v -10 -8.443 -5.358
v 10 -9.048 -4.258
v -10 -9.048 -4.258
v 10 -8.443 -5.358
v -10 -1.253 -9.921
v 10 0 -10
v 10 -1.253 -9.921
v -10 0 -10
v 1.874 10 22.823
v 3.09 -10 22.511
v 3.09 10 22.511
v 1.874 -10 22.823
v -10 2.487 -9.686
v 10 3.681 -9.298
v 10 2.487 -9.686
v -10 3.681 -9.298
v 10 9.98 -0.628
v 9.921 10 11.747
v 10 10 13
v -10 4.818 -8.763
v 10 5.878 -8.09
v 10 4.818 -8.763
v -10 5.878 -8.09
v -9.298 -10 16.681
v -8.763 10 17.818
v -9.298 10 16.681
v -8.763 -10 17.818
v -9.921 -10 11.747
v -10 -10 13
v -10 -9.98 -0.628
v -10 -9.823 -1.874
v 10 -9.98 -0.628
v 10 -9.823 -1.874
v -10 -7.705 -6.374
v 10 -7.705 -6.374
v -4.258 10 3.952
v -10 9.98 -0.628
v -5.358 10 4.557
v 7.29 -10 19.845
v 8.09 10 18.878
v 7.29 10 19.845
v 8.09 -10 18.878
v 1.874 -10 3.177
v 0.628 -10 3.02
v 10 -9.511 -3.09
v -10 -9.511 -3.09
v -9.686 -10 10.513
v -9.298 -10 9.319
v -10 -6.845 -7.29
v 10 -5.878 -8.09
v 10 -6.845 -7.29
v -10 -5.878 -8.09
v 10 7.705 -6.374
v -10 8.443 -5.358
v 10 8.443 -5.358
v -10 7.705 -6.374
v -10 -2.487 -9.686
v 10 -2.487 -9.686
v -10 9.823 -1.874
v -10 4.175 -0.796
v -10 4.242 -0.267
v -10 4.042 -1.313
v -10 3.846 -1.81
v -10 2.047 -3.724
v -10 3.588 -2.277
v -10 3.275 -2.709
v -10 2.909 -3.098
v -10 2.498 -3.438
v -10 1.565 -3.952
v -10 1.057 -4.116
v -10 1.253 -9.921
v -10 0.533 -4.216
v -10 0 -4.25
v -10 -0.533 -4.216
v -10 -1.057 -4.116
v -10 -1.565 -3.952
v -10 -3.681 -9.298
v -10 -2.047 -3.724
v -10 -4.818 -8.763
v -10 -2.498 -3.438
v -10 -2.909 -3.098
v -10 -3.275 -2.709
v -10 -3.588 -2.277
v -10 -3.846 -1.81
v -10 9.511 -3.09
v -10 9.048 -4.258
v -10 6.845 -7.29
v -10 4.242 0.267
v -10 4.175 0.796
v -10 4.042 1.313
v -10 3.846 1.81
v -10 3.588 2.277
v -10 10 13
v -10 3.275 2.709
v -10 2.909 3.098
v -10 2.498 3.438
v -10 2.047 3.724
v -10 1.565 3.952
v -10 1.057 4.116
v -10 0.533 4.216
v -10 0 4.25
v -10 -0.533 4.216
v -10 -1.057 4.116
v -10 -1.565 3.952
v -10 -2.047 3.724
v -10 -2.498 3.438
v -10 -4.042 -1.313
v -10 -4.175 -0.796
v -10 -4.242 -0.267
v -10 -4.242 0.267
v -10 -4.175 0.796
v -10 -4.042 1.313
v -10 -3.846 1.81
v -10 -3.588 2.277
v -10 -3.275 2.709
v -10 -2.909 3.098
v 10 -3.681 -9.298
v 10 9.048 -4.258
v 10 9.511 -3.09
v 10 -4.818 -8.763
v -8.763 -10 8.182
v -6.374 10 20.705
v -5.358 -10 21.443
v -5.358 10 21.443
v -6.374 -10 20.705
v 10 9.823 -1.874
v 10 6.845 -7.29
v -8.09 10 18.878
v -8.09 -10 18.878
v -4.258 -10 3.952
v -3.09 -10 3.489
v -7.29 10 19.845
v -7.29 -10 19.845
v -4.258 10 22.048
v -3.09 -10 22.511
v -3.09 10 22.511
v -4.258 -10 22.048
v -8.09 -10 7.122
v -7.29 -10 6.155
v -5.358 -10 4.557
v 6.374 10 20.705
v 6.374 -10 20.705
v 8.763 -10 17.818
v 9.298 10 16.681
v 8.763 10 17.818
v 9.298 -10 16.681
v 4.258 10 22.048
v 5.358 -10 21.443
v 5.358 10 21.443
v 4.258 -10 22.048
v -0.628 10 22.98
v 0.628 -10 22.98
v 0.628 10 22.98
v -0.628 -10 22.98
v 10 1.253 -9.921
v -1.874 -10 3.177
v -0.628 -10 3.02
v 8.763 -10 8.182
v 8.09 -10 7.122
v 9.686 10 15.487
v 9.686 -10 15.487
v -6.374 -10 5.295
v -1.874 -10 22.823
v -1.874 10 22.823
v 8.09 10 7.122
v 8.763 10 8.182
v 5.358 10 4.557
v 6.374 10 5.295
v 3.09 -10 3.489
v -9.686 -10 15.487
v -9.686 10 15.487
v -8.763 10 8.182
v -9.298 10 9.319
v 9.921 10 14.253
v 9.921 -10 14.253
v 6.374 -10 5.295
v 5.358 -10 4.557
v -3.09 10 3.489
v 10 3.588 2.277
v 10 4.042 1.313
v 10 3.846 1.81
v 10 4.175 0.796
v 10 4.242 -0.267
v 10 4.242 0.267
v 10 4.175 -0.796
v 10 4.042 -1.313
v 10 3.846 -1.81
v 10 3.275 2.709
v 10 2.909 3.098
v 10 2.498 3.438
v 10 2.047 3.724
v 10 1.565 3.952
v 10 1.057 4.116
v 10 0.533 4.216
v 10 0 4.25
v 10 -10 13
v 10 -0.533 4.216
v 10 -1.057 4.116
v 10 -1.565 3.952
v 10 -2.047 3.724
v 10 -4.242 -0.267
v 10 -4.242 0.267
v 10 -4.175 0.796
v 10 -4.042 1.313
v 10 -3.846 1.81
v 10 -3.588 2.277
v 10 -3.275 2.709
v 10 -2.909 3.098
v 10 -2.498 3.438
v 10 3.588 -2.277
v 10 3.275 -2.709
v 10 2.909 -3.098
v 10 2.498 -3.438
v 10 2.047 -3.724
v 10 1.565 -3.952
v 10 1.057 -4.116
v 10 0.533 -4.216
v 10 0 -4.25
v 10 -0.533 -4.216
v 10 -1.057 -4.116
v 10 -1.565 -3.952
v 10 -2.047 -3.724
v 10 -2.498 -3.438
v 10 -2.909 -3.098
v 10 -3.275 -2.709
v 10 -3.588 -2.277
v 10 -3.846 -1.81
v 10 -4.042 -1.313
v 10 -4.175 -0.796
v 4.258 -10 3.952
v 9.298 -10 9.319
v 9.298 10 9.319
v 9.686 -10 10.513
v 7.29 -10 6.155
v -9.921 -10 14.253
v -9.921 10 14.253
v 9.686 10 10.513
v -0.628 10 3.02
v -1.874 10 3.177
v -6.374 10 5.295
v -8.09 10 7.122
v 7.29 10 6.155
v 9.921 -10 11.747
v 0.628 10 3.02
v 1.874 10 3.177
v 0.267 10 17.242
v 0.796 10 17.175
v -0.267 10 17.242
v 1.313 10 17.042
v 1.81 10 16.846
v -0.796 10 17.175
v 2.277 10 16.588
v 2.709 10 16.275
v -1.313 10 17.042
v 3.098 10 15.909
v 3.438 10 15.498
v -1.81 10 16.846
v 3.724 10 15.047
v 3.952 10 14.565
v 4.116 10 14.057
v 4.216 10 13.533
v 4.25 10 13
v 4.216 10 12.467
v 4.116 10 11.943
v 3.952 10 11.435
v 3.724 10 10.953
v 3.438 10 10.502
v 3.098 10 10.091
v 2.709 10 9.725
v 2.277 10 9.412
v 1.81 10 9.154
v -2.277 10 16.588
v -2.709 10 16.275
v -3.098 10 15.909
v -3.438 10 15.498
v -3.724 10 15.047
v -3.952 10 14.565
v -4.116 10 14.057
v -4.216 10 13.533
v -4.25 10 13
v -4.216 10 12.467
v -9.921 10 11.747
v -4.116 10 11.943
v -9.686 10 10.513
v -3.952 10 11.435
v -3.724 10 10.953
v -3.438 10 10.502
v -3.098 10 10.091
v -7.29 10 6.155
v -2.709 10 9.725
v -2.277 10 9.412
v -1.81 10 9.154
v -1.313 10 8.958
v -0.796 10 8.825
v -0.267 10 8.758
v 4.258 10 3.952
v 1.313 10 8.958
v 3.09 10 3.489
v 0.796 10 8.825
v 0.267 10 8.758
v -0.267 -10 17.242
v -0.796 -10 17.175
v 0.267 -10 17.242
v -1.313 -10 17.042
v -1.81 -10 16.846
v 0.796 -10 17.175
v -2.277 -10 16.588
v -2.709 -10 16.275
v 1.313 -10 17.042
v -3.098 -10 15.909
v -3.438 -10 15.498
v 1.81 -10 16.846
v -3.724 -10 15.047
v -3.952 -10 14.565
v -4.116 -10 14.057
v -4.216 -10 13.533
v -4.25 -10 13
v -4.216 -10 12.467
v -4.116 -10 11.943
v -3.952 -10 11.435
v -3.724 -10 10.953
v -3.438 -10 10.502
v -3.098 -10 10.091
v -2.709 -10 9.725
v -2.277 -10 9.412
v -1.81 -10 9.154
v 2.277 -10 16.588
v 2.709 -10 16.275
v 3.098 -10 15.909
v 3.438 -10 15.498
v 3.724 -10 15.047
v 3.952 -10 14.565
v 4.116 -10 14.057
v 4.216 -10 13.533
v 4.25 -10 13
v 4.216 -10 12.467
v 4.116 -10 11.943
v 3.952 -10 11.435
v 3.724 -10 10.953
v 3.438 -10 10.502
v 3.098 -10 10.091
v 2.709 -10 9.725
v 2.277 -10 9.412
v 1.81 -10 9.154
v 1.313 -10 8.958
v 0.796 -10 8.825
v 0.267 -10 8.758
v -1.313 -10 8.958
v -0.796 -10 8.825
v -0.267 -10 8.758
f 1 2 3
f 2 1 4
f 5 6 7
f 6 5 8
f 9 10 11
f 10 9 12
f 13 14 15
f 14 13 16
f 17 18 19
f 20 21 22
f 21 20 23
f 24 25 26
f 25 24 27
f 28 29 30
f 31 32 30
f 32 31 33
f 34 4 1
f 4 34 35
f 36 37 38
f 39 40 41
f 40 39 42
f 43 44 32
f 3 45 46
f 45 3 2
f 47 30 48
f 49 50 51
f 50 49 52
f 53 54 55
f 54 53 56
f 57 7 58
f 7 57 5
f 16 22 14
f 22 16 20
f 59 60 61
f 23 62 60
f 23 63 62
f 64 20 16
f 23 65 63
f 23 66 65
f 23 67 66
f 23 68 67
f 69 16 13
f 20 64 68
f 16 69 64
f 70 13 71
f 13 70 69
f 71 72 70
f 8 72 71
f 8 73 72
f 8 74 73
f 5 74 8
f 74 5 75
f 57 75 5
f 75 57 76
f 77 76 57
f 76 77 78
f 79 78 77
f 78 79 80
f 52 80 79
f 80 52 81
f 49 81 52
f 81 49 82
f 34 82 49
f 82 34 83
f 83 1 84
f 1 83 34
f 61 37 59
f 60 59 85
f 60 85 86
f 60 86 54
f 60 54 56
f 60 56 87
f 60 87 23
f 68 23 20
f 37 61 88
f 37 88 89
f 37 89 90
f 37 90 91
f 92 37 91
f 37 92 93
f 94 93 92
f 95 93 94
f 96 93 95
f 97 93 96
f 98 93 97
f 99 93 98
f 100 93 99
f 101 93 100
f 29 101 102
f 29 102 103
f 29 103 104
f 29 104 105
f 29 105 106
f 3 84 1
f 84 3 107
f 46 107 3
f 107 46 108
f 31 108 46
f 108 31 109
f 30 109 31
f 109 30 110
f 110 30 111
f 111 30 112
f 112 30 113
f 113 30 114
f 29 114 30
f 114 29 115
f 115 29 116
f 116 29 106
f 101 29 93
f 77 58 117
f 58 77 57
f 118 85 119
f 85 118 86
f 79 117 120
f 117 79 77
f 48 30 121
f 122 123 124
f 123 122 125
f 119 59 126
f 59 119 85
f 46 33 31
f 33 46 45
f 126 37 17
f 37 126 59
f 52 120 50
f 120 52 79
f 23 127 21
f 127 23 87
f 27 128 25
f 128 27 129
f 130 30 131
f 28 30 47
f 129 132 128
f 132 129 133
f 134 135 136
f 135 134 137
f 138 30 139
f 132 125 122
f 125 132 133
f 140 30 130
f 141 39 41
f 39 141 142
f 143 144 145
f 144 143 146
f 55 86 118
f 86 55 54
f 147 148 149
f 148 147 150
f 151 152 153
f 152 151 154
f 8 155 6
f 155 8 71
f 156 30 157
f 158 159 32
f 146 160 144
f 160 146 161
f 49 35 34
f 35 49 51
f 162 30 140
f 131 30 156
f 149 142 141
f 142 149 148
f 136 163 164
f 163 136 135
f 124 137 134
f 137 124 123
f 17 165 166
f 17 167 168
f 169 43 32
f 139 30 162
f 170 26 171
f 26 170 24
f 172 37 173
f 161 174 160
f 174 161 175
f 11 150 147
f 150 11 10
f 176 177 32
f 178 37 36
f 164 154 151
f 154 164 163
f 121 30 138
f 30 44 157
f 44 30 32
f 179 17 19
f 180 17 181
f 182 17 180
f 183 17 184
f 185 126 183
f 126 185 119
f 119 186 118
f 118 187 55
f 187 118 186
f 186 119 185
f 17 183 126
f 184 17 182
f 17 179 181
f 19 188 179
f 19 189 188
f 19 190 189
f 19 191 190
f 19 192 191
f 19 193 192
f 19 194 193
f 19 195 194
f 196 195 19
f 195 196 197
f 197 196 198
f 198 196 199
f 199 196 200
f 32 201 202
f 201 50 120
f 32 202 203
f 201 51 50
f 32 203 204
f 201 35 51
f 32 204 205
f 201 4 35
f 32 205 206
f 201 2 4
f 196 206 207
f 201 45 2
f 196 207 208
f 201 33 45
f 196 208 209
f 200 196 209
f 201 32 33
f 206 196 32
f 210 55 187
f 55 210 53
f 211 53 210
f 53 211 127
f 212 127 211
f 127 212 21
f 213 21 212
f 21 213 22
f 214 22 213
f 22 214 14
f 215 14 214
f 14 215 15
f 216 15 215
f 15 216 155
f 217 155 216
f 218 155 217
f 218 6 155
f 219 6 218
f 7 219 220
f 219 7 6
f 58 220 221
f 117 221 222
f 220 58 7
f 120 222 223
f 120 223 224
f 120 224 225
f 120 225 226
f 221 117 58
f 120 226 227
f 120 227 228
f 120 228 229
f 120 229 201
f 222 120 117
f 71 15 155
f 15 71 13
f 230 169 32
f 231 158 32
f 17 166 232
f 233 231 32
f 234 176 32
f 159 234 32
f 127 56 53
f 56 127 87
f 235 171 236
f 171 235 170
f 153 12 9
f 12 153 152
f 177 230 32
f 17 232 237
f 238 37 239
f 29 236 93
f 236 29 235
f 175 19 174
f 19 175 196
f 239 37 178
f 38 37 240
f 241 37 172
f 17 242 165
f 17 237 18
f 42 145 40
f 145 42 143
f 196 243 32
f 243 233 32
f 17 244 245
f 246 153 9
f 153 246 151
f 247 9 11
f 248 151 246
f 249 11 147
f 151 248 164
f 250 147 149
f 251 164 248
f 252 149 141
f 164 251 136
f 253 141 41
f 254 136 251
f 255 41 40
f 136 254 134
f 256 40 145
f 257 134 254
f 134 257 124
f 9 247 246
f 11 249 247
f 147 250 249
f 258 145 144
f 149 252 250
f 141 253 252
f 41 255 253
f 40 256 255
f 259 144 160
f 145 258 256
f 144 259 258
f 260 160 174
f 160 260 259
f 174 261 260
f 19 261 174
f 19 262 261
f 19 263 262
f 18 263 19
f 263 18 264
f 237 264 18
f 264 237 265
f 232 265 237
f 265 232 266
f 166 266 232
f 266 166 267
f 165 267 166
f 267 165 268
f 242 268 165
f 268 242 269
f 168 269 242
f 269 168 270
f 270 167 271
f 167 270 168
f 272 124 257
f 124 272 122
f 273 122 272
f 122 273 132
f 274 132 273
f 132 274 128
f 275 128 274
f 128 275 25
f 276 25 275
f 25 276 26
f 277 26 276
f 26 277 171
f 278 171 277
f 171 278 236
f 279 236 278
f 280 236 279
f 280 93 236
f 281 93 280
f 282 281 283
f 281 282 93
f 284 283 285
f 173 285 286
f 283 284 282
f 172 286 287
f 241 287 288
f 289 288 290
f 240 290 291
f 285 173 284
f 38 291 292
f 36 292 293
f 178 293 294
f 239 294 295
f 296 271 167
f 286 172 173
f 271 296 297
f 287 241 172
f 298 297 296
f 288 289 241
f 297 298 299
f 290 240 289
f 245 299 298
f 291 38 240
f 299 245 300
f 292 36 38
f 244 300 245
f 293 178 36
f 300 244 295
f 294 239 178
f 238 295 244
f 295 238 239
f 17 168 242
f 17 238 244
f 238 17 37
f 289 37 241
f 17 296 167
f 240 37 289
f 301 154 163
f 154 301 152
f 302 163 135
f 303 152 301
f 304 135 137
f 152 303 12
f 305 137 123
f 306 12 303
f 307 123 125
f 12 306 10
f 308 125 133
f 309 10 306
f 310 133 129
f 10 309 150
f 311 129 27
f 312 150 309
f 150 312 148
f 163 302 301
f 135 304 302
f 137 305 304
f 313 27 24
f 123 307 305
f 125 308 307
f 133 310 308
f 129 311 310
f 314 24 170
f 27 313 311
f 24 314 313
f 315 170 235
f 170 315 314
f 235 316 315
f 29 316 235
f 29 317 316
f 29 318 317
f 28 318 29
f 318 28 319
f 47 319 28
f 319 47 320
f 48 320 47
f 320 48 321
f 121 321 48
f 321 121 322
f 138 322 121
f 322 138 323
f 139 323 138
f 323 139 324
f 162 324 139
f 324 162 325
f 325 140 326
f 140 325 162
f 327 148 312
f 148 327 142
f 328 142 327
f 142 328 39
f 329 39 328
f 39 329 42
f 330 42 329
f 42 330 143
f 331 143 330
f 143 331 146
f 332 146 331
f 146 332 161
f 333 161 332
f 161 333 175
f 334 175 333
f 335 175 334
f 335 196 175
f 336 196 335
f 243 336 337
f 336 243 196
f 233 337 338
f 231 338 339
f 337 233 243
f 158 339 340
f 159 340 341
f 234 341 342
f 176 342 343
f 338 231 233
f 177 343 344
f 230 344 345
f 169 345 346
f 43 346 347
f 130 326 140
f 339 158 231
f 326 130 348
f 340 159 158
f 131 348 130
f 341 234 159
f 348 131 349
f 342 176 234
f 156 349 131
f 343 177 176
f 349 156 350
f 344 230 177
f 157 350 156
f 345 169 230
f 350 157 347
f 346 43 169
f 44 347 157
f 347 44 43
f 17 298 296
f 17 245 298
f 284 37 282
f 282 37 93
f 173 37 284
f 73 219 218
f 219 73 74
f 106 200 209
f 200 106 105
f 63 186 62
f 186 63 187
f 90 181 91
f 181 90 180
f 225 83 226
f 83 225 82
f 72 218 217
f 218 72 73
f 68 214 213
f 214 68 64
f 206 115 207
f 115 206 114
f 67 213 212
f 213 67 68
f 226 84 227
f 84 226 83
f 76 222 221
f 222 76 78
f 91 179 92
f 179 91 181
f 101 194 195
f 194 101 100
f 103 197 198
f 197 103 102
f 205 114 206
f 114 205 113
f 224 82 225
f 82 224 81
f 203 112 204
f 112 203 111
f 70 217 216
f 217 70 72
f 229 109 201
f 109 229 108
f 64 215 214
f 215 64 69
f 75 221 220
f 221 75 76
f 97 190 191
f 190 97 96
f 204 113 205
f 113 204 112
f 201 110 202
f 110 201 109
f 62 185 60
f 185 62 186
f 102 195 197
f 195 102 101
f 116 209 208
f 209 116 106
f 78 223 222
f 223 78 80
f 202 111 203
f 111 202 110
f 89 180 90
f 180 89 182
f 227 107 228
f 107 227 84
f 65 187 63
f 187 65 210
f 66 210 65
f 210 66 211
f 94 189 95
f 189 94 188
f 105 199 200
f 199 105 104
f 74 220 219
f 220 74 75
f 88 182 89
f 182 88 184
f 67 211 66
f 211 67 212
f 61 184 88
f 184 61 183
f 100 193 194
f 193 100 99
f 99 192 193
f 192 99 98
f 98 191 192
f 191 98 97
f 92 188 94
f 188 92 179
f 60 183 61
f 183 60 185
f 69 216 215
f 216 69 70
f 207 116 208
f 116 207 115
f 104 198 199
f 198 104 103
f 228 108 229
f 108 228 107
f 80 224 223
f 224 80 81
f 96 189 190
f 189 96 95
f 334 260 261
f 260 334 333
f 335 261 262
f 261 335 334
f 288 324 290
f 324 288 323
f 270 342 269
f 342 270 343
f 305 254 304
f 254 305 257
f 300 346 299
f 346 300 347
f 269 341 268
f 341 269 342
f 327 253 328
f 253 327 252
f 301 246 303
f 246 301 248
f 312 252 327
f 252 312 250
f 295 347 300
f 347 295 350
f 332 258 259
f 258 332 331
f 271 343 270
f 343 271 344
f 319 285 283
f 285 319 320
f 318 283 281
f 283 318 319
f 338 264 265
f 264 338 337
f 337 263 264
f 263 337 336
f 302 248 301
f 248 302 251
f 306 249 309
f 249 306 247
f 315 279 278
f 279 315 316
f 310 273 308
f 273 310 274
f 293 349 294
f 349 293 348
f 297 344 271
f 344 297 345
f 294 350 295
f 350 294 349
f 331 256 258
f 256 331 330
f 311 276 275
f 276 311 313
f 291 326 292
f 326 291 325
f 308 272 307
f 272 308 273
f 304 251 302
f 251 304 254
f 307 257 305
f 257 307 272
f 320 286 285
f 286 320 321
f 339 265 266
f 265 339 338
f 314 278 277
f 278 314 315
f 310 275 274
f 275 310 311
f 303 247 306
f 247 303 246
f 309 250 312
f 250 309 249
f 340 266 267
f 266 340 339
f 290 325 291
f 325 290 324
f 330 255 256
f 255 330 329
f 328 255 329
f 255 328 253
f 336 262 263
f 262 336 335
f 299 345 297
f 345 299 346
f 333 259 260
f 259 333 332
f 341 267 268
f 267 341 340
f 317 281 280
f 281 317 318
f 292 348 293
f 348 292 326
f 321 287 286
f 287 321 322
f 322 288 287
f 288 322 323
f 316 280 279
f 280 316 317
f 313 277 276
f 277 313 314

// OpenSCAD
// file: variables.scad
// ##########################################//
// General
// ##########################################//
$fn = 50;
DIFFERENCE_FIX = 0.1;
DIFFERENCE_FIX_NEGATIVE = -1 * DIFFERENCE_FIX;
DIFFERENCE_FIX_2 = 2 * DIFFERENCE_FIX;

// ##########################################//
// Nose
// ##########################################//
noseTopThickness = 1;
noseTopOffsetZ = 60;
noseHeight = noseTopOffsetZ + noseTopThickness;
noseLength = 100;
noseTopEndOffset = 20;
noseTopSharpnessFactor = 4;
noseBotttomSharpnessFactor = 3;
noseTopThicknessFactor = 1;
noseBottomThicknessFactor = 3;

// ##########################################//
// Hull
// ##########################################//
hullThickness = 3;
hullWidth = 70 - hullThickness * 2;
hullLength = 500 - hullThickness * 2;
hullHeight = noseHeight + hullThickness;
hullSpacing = 100;
hullCutoutWidth = 46;
hullCutoutHeight = 150;

// ##########################################//
// Hull Mounts
// ##########################################//
hullMountHoleRadius = 4.25;
hullMountHeight = 20;
hullMountWidth = 20;
hullMountDepth = 50;
hullMountOffsetY = 100;

// ##########################################//
// Rod Connectors
// ##########################################//
rodConnectorWidth = 20;
rodConnectorRadius = 10;
rodConnectorTopOffset = 3;

// ##########################################//
// Lid
// ##########################################//
lidLip = 5;
lidThickness = 3;
lidGap = 0.4;
lidText = "+1 555 123 1234";
lidTextOffsetX = 28;
lidTextOffsetY = 20;

// ##########################################//
// Motor mount
// ##########################################//
motorMountMotorRadius = 35;
motorMountMotorDepth = 100;
motorMountThickness = 4;
motorMountMountThickness = 5;
motorMountMountOffsetX = 20;
motorMountSupportHeight = 10;
motorMountSupportExtensionY = 30;
motorMountOffsetY = 300;
motorMountRudderSupportHeight = 5;
motorMountRudderSupportWidth = 10;
motorMountRudderSupportExtensionY = 20;


// ##########################################//
// Rudder
// ##########################################//
rudderHeight = motorMountMotorRadius * 2 - 10;
rudderWidth = 60;
rudderThickness = 3;
rudderMountTopHeight = motorMountRudderSupportHeight + 1;
// main file
include <variables.scad>

module rodConnector() {
    difference() {
        hull() union() {
            // Lower cylinder
            rotate([0, 90, 0])
            cylinder(h = rodConnectorWidth, r = rodConnectorRadius, center = true);

            // Upper cylinder
            translate([0, 0 , rodConnectorRadius + rodConnectorTopOffset])
            rotate([90, 0, 0])
            cylinder(h = rodConnectorWidth, r = rodConnectorRadius, center = true);
        }

        // Lower cutout
        rotate([0, 90, 0])
        cylinder(h = rodConnectorWidth + DIFFERENCE_FIX_2, r = hullMountHoleRadius, center = true);

        // Upper cutout
        translate([0, 0 , rodConnectorRadius + rodConnectorTopOffset])
        rotate([90, 0, 0])
        cylinder(h = rodConnectorWidth + DIFFERENCE_FIX_2, r = hullMountHoleRadius, center = true);
    }

}

rodConnector();
